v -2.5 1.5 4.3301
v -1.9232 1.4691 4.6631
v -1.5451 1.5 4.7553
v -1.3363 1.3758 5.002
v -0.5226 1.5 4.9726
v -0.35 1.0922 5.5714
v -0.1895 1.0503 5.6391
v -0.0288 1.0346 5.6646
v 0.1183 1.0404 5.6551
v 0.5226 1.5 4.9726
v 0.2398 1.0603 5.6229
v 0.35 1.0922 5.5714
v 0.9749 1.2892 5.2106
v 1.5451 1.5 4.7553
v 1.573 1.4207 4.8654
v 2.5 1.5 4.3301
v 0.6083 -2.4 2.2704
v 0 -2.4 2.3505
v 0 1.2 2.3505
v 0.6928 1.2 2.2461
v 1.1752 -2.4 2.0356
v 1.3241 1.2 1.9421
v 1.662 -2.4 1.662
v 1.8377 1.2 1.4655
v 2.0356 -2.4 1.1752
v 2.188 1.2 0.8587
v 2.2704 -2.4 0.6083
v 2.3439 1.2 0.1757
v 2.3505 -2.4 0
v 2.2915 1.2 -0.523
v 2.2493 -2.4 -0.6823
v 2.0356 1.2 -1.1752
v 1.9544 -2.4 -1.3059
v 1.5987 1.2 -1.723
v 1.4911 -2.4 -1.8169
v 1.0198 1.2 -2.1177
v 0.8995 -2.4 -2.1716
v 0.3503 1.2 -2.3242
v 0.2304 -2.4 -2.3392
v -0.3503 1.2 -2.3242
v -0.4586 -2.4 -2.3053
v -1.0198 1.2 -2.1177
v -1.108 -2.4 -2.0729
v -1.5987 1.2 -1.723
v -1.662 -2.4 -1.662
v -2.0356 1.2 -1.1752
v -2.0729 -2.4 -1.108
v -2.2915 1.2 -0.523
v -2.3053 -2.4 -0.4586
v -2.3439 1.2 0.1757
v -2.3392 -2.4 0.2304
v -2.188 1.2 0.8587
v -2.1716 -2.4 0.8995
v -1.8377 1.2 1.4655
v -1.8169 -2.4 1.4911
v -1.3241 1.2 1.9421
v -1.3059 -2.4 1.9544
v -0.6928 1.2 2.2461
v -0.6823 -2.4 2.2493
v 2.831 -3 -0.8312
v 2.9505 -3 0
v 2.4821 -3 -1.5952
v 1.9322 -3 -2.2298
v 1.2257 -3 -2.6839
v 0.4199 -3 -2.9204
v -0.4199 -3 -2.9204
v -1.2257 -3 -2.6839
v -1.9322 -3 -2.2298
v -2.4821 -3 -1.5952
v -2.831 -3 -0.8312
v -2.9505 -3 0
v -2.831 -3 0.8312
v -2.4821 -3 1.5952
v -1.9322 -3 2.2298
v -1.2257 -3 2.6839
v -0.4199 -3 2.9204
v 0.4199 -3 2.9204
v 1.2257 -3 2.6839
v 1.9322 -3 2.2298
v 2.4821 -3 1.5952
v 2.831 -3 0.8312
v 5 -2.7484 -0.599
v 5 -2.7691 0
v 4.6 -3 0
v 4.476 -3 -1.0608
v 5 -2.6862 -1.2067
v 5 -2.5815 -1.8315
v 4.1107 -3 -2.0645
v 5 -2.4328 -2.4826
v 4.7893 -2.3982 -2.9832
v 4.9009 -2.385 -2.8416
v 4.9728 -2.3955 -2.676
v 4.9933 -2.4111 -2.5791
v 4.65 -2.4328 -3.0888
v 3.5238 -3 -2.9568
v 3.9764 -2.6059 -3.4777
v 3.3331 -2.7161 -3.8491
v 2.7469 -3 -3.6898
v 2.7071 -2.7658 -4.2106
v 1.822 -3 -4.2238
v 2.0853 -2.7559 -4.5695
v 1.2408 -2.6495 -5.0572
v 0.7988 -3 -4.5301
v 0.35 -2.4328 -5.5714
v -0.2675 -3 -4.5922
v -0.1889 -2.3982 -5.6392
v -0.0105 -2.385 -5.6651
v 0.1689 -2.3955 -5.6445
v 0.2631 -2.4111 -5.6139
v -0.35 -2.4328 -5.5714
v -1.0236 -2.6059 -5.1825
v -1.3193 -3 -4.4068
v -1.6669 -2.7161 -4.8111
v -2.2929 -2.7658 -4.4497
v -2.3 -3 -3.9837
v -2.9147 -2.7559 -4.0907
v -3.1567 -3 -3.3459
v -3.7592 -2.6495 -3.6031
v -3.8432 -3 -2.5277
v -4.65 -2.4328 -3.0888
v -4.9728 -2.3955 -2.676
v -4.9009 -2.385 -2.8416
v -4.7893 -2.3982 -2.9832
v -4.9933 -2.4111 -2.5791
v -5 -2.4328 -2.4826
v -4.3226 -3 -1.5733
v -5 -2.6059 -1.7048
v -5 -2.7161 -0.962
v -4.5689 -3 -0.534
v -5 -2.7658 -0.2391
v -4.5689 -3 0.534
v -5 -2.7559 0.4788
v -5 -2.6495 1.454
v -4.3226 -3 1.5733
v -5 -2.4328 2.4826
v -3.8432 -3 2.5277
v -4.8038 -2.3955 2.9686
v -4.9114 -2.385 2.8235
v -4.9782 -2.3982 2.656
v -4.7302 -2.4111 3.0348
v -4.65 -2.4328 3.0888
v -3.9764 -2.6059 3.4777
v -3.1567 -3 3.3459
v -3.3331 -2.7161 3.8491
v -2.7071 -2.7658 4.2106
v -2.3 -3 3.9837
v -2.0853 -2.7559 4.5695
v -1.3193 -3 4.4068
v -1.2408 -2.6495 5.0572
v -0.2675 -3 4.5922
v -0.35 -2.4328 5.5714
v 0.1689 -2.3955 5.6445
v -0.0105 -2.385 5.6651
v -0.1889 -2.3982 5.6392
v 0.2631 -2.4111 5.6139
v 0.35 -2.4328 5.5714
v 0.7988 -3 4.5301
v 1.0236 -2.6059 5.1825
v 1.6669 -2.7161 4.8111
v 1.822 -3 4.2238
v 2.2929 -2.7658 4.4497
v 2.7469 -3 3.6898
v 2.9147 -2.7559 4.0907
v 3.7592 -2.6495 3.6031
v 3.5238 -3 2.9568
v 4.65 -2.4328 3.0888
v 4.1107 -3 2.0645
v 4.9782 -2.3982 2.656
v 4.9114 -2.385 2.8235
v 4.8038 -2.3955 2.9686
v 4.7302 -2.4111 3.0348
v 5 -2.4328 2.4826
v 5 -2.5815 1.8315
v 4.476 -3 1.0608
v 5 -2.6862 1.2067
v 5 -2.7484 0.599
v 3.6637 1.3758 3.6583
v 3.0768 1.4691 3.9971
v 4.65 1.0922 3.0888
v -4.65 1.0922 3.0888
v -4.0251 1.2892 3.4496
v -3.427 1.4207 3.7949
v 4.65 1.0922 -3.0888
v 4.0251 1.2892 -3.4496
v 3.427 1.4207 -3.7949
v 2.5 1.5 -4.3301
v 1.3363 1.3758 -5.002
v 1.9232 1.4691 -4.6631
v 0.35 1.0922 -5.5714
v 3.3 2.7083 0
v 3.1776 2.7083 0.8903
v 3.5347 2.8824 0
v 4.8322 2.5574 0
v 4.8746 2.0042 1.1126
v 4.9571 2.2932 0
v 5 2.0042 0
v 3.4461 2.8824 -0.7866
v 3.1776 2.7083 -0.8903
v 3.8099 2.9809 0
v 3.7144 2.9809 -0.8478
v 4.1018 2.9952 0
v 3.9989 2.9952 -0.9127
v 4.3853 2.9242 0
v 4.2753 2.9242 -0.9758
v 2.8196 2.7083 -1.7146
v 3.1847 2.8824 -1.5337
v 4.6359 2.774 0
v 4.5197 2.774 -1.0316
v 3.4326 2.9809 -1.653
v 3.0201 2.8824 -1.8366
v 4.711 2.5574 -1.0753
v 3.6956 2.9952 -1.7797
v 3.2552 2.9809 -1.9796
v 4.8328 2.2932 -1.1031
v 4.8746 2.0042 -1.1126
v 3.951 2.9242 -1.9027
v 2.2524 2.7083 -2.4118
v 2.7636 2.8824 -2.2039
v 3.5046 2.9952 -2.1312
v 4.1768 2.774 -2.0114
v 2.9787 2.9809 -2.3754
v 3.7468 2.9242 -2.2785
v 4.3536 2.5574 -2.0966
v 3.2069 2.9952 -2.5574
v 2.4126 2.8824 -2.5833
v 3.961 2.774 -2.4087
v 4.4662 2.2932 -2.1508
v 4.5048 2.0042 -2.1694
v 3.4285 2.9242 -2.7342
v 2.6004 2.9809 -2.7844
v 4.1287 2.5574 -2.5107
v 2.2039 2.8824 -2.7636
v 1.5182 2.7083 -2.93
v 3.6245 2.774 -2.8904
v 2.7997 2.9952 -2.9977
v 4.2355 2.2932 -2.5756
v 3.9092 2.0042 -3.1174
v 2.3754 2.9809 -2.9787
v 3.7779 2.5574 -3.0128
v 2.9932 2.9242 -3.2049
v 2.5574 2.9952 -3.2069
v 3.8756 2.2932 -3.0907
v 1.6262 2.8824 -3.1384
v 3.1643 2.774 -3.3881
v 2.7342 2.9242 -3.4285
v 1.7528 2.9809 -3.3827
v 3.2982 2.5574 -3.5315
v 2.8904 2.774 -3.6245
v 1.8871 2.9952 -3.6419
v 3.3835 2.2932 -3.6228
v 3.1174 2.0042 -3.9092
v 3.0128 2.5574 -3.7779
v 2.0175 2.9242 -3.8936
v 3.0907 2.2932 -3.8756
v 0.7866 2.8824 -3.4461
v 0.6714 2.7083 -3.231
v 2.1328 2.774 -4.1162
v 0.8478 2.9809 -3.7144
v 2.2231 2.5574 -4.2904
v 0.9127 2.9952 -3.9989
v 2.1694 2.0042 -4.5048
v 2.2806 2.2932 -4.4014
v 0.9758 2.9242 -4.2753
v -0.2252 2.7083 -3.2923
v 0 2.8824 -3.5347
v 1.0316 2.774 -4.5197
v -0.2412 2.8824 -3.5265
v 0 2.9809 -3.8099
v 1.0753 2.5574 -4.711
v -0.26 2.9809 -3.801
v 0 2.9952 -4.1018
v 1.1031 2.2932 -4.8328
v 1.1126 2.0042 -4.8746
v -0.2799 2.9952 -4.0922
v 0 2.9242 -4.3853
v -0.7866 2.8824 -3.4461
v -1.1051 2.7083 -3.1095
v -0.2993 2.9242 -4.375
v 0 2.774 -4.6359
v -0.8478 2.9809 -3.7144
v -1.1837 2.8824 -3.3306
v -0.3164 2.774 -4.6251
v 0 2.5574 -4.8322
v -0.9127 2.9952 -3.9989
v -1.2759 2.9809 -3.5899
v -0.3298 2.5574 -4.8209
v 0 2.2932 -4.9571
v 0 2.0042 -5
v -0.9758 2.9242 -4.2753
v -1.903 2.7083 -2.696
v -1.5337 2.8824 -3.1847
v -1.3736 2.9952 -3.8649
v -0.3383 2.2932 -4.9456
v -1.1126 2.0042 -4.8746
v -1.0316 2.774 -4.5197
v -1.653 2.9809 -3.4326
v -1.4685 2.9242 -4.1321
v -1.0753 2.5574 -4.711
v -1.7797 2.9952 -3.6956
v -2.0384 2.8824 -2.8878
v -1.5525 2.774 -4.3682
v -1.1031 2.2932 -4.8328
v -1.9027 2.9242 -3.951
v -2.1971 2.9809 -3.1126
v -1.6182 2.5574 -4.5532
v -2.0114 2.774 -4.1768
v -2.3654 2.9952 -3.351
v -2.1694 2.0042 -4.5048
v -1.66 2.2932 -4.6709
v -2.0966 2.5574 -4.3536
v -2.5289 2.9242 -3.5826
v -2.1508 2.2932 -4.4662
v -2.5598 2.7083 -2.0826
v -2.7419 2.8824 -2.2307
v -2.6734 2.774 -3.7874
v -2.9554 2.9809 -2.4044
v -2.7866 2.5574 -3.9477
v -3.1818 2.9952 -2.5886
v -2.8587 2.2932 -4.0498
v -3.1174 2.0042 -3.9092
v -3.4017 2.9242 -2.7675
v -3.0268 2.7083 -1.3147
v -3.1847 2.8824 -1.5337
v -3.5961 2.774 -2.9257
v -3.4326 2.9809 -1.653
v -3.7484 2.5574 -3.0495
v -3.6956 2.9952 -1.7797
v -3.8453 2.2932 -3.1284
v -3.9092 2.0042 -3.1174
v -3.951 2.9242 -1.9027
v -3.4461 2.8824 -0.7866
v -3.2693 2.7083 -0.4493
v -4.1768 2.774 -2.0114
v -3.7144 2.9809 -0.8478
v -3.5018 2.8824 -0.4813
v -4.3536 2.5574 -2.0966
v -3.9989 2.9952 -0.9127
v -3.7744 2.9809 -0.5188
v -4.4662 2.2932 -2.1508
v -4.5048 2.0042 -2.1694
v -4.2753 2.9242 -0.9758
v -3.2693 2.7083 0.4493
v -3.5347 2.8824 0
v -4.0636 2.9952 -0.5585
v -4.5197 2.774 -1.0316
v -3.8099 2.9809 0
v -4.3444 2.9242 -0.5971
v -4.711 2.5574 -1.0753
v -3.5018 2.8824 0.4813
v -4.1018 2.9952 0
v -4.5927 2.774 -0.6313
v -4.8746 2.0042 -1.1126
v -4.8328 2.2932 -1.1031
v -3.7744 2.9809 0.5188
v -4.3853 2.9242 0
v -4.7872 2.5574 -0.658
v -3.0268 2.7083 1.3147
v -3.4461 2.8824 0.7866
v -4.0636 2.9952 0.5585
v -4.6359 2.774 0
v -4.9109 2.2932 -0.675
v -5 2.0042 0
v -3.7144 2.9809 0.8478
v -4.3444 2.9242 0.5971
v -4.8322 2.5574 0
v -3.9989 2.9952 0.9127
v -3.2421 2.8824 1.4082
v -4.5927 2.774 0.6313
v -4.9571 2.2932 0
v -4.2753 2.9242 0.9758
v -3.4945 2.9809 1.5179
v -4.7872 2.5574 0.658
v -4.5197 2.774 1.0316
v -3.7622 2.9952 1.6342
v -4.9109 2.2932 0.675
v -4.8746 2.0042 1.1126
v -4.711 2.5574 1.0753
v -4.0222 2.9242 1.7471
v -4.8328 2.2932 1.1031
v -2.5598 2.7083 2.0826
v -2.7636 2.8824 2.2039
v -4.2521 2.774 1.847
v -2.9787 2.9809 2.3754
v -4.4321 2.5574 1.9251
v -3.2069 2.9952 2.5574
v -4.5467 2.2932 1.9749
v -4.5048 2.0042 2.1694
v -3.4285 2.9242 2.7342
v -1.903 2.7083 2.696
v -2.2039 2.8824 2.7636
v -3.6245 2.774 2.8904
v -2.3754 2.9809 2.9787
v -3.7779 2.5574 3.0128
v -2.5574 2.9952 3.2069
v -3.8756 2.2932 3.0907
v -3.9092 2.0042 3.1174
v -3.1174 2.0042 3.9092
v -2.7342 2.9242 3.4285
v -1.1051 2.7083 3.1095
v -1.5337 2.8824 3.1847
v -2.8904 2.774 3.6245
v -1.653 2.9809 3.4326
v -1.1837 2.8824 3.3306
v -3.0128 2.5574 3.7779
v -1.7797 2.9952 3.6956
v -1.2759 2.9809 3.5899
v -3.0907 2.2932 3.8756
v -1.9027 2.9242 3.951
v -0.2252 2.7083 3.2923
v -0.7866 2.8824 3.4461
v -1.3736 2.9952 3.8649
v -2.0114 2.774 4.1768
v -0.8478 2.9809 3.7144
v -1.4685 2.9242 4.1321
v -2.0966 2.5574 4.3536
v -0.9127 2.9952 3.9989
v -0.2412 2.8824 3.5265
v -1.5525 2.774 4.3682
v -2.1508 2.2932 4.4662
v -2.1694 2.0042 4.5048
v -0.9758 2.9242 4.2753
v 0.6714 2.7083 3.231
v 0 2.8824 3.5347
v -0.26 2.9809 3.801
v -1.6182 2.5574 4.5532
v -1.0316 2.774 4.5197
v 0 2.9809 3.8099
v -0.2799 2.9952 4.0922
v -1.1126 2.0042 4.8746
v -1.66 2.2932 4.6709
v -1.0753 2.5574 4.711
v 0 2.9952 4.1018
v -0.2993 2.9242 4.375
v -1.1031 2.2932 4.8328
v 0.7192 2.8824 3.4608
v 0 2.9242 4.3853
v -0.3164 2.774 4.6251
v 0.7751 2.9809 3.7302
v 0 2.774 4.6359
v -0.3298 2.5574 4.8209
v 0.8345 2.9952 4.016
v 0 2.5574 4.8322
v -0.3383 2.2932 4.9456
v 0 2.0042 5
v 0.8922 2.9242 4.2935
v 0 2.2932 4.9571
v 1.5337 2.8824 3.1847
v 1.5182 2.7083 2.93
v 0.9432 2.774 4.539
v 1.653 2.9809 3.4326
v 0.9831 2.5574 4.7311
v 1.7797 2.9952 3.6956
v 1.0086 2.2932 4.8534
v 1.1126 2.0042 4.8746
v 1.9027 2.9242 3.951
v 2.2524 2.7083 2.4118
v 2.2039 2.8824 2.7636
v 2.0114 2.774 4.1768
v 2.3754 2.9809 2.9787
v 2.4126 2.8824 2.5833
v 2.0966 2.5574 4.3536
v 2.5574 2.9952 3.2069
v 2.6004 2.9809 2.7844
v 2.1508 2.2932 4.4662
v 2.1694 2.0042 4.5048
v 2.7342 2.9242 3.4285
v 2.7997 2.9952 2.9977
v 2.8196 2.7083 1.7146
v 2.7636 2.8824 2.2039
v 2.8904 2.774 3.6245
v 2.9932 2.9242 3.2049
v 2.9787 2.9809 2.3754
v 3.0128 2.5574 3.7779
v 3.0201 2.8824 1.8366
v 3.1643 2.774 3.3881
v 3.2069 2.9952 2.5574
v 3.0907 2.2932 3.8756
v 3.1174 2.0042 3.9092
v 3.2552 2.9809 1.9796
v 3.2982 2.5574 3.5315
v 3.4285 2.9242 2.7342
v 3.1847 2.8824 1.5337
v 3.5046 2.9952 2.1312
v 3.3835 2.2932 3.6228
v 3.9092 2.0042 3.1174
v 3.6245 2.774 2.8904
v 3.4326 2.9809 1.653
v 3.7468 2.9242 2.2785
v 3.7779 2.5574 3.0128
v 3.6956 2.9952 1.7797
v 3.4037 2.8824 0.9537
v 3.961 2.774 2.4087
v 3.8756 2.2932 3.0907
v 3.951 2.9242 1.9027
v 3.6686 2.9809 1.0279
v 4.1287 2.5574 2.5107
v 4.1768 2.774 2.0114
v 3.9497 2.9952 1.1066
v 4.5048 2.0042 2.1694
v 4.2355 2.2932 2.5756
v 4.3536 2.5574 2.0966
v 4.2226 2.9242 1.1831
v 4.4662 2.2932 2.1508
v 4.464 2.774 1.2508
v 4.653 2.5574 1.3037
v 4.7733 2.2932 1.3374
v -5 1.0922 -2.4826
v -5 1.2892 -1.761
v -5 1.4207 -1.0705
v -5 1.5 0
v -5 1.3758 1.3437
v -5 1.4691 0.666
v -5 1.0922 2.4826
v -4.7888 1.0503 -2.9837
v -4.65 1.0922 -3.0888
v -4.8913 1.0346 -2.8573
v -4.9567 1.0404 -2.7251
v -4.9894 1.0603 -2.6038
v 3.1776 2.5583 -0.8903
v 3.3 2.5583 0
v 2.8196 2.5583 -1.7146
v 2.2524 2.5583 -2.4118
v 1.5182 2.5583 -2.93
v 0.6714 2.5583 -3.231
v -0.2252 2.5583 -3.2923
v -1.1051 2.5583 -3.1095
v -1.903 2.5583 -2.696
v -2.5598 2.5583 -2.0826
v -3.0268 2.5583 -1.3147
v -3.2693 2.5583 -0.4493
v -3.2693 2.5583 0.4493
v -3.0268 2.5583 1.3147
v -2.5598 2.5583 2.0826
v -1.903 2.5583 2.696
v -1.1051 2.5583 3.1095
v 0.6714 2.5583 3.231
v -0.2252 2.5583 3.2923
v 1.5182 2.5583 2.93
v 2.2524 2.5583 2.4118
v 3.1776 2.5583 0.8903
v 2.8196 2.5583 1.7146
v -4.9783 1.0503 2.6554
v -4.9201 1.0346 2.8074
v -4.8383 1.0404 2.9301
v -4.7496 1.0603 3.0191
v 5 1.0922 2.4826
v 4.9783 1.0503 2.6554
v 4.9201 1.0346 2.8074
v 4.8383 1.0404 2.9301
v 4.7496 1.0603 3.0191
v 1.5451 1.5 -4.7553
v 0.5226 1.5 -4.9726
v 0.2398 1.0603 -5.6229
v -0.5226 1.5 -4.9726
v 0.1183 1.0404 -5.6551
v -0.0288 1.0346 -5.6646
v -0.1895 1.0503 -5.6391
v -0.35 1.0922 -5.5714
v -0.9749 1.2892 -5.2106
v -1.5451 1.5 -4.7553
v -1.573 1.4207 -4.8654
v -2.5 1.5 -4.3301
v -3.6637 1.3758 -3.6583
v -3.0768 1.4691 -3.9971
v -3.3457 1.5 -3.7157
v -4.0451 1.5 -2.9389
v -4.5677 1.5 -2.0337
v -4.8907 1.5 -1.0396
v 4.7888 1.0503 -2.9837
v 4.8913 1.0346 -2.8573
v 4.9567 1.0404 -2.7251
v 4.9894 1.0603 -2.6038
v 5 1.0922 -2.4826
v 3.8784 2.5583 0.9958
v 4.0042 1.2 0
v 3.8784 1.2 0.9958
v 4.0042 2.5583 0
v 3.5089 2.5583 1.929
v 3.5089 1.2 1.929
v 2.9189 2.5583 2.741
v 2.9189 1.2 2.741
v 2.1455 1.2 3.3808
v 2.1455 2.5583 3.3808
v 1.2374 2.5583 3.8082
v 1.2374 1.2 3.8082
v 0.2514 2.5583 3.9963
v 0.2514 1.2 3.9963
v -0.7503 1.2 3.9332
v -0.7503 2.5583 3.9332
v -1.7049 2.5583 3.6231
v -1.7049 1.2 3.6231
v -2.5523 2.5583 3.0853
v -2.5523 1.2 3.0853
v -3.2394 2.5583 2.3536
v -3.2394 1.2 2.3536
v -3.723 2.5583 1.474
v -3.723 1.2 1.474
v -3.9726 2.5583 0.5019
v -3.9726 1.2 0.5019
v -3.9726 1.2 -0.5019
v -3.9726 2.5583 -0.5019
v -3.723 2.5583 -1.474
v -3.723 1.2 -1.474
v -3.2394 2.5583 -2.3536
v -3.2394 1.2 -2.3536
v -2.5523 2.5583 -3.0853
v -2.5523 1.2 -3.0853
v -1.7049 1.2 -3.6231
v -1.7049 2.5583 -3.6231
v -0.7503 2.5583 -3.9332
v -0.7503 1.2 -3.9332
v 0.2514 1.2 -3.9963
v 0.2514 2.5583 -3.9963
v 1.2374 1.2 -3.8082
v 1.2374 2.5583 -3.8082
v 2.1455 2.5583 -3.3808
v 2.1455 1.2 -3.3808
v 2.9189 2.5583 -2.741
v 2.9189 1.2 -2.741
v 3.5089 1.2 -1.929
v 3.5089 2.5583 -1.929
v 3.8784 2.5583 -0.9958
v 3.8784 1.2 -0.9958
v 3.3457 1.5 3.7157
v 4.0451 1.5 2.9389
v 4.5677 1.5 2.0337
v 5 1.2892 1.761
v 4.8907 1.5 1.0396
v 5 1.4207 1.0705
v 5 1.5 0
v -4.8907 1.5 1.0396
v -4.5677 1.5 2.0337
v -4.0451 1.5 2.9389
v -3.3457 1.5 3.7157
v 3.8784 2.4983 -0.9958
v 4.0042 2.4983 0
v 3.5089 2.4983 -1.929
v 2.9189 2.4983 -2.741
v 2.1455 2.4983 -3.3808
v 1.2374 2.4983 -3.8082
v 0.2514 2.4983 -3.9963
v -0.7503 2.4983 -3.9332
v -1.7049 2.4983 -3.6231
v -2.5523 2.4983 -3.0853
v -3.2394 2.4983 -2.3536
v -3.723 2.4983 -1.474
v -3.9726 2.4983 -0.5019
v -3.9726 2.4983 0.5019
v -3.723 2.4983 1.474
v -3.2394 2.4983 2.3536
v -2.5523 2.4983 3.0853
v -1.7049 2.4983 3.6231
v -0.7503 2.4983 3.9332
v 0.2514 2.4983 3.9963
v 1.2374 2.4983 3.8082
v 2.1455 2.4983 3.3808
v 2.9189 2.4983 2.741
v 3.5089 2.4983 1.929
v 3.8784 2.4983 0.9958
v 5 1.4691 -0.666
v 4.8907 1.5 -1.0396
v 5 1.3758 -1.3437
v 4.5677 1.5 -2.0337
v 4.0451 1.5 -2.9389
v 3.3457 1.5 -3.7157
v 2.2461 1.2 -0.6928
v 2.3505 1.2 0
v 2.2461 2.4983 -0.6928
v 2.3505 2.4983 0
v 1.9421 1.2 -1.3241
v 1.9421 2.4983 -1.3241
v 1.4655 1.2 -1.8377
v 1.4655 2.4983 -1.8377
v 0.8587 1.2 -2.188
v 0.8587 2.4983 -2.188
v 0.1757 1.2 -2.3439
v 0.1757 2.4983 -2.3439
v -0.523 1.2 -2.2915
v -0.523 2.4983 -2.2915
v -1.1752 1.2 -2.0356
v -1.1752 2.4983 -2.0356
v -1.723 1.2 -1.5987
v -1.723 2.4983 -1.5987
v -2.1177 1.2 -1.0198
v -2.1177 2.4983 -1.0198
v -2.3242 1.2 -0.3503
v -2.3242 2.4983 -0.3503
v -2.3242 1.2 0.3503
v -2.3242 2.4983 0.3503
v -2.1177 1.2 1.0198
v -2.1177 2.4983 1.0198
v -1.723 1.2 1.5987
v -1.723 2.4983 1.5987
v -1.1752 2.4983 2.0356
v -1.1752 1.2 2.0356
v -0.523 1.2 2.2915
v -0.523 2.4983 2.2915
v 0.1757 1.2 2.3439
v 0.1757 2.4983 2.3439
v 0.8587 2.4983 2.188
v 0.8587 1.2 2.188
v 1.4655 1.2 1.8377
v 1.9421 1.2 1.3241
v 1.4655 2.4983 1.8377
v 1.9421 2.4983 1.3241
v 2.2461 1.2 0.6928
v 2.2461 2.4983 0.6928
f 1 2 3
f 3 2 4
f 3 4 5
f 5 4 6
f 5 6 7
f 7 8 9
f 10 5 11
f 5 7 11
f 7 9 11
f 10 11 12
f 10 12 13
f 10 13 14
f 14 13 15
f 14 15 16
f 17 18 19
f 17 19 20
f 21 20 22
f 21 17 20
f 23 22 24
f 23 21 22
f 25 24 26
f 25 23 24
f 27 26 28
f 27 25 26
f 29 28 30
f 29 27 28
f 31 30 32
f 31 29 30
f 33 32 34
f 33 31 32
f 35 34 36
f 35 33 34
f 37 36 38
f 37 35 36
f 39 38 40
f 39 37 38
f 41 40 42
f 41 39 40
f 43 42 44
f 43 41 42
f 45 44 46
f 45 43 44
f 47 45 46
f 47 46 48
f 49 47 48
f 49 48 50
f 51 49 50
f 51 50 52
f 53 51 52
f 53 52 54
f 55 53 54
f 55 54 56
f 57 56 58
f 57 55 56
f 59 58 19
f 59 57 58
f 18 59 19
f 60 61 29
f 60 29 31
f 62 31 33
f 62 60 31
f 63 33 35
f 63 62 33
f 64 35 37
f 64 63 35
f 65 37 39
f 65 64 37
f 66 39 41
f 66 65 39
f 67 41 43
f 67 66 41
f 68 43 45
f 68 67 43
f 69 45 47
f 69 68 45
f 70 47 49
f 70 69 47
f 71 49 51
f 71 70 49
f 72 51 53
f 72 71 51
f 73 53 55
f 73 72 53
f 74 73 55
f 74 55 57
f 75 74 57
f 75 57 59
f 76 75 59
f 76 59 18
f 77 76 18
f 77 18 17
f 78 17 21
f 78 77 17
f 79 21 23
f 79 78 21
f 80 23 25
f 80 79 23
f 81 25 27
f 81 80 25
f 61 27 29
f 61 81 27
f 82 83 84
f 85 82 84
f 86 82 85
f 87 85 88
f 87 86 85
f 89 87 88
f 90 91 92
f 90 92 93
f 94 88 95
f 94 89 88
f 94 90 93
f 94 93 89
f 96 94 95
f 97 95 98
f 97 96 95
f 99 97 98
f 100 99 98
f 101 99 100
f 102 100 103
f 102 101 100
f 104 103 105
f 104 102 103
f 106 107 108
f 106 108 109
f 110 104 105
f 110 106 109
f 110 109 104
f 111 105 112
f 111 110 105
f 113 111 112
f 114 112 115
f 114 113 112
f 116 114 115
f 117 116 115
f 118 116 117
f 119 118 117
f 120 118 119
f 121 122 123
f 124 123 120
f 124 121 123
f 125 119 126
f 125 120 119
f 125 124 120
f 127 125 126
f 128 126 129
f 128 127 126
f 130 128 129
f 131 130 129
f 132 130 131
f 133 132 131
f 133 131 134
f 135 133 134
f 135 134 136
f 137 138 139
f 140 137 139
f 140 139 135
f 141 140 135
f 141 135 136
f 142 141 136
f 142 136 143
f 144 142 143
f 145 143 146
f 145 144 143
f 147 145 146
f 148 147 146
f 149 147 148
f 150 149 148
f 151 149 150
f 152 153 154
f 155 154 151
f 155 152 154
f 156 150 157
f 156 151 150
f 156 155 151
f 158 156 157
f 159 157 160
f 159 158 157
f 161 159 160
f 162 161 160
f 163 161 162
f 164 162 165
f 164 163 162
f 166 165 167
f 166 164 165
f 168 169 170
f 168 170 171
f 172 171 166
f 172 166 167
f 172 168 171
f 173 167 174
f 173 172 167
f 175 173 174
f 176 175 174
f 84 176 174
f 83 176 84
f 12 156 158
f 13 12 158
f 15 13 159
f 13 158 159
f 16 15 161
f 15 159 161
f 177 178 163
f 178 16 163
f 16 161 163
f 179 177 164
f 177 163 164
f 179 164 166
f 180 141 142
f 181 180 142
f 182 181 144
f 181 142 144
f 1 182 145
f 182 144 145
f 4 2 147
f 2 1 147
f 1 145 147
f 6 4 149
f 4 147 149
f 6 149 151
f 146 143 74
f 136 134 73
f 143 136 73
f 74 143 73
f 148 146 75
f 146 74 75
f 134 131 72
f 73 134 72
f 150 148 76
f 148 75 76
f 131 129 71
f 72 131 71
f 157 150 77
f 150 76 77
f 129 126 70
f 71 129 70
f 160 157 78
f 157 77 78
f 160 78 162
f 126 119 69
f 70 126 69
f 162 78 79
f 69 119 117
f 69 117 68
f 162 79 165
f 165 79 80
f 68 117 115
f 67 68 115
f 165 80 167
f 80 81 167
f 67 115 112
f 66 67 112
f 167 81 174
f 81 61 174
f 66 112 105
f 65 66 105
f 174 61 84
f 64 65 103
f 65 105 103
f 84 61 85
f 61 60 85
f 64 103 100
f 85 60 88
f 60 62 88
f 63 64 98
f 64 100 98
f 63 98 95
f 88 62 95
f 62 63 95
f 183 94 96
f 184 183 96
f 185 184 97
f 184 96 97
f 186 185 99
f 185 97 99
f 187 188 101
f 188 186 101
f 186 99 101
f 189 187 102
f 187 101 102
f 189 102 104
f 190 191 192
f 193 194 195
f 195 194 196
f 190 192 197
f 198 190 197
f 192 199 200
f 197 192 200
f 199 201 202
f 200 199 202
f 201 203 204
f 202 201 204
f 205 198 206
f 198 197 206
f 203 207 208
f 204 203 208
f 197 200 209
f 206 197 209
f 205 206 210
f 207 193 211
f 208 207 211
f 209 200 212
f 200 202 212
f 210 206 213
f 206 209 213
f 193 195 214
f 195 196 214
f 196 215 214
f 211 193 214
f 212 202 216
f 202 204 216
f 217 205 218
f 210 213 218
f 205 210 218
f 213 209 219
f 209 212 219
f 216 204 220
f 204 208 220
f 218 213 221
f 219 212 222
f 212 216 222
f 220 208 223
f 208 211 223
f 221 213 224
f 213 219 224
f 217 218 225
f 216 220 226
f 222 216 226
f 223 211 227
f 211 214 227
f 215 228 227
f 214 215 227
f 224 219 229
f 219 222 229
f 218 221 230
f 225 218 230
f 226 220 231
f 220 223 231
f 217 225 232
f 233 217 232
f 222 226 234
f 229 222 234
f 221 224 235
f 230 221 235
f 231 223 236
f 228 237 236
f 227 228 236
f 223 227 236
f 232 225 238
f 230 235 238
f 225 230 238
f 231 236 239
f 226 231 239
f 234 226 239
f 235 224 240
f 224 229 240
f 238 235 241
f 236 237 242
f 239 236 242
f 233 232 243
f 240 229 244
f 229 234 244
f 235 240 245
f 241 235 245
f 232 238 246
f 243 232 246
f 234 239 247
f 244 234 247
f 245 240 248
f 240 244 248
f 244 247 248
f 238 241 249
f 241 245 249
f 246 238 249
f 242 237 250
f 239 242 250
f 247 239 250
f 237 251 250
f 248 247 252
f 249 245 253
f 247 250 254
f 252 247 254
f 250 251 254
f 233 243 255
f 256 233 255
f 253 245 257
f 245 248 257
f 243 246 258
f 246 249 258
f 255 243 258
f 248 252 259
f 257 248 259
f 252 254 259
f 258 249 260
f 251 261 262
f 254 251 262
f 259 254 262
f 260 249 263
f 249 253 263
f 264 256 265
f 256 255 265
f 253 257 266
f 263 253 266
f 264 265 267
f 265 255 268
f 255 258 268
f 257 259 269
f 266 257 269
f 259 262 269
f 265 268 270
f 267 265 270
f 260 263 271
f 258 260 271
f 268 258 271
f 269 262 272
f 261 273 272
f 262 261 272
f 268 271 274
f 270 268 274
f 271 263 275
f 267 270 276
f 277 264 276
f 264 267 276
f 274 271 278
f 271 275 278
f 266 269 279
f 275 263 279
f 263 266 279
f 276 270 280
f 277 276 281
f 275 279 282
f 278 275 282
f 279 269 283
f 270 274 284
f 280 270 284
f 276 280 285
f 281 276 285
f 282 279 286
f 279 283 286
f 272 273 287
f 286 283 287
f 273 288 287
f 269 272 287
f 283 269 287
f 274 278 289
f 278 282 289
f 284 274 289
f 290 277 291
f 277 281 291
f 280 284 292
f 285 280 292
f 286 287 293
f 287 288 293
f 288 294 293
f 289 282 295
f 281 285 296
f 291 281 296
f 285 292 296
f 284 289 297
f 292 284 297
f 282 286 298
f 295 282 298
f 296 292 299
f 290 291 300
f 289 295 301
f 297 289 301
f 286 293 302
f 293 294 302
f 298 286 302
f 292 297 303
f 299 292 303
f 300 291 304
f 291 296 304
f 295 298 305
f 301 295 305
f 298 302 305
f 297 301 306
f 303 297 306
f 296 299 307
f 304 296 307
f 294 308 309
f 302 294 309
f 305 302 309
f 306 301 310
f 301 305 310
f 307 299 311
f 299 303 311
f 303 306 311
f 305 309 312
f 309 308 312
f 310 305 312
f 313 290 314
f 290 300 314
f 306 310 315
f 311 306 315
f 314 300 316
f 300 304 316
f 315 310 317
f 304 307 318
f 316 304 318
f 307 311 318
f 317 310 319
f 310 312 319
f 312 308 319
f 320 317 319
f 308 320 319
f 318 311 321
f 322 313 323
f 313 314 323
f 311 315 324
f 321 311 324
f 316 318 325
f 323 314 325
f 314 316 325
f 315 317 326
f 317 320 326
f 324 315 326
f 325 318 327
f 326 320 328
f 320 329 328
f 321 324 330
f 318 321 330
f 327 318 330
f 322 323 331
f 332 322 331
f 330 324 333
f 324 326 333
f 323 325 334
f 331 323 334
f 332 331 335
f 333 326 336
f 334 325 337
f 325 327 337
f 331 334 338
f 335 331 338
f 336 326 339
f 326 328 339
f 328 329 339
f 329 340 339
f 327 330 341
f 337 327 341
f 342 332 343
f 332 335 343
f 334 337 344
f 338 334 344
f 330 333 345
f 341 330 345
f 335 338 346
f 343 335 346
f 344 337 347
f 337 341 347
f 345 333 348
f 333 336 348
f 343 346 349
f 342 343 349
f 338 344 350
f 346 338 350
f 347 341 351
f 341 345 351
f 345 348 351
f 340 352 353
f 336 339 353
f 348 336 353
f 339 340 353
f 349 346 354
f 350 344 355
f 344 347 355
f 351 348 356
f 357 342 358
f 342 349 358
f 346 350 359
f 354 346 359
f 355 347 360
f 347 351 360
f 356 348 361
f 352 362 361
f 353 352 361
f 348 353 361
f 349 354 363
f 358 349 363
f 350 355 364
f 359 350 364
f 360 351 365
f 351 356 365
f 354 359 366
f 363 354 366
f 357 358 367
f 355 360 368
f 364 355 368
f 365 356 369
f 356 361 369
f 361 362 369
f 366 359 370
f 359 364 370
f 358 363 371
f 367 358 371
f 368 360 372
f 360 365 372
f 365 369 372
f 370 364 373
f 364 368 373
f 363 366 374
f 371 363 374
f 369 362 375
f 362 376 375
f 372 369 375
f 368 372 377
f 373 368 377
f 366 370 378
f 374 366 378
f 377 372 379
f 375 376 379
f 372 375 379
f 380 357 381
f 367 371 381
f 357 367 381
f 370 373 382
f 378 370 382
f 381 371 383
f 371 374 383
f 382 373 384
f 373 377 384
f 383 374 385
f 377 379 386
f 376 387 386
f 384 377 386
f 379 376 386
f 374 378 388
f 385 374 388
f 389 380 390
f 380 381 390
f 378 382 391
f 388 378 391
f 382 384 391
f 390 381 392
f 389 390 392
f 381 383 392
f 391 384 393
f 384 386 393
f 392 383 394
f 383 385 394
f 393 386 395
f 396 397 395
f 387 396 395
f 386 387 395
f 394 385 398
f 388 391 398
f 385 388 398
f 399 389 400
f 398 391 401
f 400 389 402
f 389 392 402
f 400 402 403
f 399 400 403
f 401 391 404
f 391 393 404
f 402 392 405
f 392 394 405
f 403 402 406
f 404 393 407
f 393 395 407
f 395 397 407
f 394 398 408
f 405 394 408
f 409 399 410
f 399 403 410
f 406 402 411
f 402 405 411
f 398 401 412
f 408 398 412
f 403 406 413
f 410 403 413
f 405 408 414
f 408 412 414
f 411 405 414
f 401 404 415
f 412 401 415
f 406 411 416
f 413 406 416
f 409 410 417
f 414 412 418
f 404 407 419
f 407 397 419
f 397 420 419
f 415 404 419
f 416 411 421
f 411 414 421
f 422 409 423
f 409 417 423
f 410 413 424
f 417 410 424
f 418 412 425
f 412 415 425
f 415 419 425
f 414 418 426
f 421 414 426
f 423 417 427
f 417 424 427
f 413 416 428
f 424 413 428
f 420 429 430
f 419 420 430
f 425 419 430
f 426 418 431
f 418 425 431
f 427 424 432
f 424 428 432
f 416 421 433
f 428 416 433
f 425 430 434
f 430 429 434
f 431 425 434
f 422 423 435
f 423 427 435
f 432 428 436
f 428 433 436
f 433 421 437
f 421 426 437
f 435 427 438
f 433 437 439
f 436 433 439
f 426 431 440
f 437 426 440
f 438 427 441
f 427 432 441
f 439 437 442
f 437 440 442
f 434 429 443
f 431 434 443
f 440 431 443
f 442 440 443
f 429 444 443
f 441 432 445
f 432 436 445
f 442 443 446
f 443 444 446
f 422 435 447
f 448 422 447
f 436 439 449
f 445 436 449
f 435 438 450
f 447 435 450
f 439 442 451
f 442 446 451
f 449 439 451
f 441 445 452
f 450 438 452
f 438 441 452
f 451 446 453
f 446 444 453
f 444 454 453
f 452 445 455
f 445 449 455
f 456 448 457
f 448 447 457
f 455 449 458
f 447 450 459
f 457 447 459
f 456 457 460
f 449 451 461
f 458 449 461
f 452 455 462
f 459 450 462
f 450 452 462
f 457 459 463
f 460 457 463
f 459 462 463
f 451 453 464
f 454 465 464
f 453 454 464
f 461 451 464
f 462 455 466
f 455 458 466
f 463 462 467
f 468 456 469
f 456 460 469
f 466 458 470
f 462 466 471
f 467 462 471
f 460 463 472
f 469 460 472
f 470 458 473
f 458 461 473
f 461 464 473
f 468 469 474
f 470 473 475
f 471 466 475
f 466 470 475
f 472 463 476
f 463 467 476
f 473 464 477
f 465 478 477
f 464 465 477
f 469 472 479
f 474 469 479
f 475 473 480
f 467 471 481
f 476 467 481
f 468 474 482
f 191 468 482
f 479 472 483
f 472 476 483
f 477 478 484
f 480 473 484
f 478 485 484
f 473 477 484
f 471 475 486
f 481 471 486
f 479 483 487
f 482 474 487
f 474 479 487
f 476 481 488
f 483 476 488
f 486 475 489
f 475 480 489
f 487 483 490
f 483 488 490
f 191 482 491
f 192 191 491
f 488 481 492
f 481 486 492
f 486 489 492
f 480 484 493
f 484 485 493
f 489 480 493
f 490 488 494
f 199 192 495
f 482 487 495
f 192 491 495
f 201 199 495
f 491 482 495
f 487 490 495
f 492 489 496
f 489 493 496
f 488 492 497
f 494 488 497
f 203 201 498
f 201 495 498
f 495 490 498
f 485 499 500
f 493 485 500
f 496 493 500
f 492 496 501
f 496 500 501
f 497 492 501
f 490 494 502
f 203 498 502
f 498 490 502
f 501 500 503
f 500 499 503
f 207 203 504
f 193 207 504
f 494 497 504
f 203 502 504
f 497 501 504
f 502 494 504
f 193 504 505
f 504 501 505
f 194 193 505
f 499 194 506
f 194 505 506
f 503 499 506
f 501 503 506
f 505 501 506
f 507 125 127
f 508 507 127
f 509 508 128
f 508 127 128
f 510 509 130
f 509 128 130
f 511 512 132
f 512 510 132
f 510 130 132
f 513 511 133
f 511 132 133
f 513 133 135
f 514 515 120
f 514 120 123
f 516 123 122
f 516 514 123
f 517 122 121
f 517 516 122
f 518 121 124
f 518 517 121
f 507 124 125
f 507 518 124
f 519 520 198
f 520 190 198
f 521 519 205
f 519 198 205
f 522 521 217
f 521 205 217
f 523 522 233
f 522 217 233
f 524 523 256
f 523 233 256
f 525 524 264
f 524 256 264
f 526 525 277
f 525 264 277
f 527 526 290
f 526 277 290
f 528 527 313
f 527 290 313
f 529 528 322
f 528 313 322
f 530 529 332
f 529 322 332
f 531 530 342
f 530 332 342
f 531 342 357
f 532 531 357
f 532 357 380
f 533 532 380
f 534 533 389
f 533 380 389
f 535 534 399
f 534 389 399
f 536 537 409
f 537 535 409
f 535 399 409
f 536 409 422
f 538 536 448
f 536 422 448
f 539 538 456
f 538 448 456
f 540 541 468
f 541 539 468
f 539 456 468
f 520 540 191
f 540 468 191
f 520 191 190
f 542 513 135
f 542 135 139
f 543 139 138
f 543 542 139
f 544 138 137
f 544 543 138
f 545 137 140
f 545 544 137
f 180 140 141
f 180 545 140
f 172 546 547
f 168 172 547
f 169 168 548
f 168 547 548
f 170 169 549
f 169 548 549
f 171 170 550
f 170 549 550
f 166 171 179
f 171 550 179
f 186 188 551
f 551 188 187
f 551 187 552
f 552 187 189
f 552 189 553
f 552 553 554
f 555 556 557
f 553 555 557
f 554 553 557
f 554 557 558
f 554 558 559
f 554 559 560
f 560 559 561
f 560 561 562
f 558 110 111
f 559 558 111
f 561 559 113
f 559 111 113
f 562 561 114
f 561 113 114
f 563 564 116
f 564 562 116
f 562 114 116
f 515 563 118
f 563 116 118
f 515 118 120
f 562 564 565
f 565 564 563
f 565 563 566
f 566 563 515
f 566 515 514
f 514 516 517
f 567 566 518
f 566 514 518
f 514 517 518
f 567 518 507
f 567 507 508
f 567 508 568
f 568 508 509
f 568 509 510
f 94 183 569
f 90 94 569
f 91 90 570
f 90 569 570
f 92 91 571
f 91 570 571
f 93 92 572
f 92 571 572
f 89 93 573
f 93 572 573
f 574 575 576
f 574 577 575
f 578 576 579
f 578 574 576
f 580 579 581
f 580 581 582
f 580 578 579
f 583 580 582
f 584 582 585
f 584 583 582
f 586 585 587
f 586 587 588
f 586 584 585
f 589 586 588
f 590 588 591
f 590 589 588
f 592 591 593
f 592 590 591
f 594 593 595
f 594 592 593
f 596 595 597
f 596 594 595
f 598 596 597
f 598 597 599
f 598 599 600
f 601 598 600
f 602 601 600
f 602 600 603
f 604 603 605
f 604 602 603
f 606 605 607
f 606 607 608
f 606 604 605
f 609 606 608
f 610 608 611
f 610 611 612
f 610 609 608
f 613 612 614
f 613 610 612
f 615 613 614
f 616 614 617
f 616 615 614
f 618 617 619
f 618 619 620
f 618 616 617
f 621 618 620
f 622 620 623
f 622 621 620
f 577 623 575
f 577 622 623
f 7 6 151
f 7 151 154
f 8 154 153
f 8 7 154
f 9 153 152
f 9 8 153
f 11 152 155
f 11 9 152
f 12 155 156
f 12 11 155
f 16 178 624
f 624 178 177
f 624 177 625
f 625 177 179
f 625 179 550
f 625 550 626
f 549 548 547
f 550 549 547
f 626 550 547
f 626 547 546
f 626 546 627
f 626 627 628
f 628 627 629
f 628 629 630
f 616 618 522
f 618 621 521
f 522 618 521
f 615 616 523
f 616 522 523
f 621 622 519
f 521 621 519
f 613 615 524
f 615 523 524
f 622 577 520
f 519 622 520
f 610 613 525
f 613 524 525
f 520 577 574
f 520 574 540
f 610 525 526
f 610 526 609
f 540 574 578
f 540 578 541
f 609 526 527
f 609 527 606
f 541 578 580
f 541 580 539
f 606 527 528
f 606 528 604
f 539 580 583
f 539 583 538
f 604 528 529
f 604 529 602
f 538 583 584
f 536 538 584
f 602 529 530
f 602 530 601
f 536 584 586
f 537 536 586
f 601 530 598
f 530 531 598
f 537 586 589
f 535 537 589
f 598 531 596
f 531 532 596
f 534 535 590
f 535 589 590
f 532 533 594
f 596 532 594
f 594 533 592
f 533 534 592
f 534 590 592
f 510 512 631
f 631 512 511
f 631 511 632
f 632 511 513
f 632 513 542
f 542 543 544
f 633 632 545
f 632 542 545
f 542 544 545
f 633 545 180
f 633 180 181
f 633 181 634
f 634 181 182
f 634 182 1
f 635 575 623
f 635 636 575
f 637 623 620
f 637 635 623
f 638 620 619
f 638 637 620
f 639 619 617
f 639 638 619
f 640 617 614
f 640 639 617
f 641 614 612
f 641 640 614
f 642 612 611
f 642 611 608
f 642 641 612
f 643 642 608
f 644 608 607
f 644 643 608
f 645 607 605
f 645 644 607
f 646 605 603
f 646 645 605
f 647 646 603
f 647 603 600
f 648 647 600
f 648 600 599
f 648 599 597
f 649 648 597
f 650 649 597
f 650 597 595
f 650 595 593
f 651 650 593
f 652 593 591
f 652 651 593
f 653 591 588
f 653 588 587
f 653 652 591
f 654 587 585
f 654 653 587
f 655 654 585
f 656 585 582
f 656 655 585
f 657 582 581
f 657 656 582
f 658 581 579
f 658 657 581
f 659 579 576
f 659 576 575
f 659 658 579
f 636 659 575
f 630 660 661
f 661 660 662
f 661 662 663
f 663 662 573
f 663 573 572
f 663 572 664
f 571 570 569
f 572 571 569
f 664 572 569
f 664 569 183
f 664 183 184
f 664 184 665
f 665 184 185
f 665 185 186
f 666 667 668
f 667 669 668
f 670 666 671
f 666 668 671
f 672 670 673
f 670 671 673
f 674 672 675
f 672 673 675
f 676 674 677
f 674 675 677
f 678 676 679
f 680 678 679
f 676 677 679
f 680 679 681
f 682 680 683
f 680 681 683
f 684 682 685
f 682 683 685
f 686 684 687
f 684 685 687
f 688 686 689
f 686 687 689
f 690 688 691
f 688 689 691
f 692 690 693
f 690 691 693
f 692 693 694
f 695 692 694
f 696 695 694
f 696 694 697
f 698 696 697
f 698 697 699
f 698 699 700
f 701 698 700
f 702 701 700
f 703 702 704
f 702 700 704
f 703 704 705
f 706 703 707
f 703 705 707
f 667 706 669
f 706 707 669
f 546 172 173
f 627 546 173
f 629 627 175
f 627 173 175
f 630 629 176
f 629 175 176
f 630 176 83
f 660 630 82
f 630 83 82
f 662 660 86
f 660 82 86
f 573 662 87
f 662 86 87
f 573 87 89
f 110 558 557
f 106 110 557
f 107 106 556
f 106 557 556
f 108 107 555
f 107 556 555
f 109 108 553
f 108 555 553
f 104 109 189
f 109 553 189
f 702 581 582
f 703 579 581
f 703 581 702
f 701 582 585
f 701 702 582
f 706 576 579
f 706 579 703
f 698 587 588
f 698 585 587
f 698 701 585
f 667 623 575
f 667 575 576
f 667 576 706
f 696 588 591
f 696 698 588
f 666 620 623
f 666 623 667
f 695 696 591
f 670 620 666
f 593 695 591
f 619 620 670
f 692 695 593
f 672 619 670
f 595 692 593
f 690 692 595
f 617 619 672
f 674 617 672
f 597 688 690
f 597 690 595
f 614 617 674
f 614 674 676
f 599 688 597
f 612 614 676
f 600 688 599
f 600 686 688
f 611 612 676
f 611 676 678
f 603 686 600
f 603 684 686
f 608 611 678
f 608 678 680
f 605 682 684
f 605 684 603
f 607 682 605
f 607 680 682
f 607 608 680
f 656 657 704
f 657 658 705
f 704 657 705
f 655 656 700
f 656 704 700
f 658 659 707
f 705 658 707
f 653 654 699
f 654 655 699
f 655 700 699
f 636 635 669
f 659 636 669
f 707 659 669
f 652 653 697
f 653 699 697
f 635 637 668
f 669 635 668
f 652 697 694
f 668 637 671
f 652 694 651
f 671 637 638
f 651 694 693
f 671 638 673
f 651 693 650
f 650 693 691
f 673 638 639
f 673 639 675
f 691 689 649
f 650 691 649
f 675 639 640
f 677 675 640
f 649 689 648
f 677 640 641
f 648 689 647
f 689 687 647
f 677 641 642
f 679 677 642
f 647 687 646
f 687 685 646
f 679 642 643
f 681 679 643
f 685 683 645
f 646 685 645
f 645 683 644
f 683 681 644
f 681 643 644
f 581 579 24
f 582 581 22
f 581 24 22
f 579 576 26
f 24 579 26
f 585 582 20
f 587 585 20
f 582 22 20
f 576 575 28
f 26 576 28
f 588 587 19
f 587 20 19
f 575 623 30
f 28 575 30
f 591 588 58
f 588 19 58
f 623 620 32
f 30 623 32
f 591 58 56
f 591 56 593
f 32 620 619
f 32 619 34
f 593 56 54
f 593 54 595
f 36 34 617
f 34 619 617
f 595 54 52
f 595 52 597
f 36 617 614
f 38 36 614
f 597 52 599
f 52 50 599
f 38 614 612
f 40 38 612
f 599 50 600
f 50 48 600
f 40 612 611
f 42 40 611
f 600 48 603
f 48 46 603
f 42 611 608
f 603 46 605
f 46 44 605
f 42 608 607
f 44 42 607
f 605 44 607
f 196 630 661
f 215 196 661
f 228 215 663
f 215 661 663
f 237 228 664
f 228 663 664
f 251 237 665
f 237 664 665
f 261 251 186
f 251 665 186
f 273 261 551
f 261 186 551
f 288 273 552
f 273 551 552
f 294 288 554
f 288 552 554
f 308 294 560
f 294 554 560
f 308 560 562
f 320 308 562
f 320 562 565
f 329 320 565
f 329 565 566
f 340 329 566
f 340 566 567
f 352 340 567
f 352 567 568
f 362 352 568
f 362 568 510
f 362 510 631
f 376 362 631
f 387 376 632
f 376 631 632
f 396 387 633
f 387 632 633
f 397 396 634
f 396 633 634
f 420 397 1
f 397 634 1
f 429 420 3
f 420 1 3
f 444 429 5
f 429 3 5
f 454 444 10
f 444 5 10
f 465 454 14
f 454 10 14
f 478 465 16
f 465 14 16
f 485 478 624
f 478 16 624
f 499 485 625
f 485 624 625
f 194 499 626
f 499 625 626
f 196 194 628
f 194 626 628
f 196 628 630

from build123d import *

# Parameters (mm, degrees)
BOSS_EXTRUDE1_DEPTH      = 3
BOSS_EXTRUDE1_DEPTH_BACK = 3
SKETCH2_R                = 2.350480947
FILLET1_R                = 0.7
SKETCH12_W               = 0.704163056
SKETCH12_H               = 1.358326112
SKETCH4_W                = 1.653682109
SKETCH4_H                = 1.298326112


with BuildPart() as part:
    # Sketch2 → Boss-Extrude1 (new, two sides: drawn at the far end of the back side and taken through both)
    with BuildSketch(Plane(origin=(0, 0, 0), x_dir=(1, 0, 0), z_dir=(0, 1, 0)).offset(-BOSS_EXTRUDE1_DEPTH_BACK)):
        Polygon((0, 5.773502692), (-5, 2.886751346), (-5, -2.886751346), (0, -5.773502692), (5, -2.886751346), (5, 2.886751346), align=None)
        with Locations(Location((0, 0, 0), (0, 0, 270))):
            Circle(SKETCH2_R, mode=Mode.SUBTRACT)
    extrude(amount=BOSS_EXTRUDE1_DEPTH + BOSS_EXTRUDE1_DEPTH_BACK)

    # Fillet1
    fillet1_edges = [part.edges().sort_by_distance(p)[0] for p in [
        (5, 0, -2.886751346),
        (5, 0, 2.886751346),
        (0, 0, 5.773502692),
        (-5, 0, 2.886751346),
        (-5, 0, -2.886751346),
        (0, 0, -5.773502692),
    ]]
    fillet(fillet1_edges, radius=FILLET1_R)

    # Sketch3 → Cut-Revolve2 (revolve, cut)
    with BuildSketch(Plane(origin=(0, 0, 0), x_dir=(0, 0, -1), z_dir=(1, 0, 0)), mode=Mode.PRIVATE) as cut_revolve2_sk:
        with BuildLine():
            Line((5.773502692, 1.5), (5.773502692, 4))
            Line((5.773502692, 4), (2.350480947, 4))
            Line((2.350480947, 4), (2.350480947, 1.2))
            Line((2.350480947, 1.2), (3.3, 1.2))
            Line((3.3, 1.2), (3.3, 2.708326112))
            ThreePointArc((3.3, 2.708326112), (4.385253356, 2.924196426), (5, 2.004163056))
            Line((5, 2.004163056), (5, 1.5))
            Line((5, 1.5), (5.773502692, 0.958387584))
            Line((5.773502692, 0.958387584), (5.773502692, 1.5))
        make_face()
        Polygon((4.6, -3), (5.773502692, -2.322477905), (5.773502692, -3), align=None)
        Polygon((2.350480947, -3), (2.350480947, -2.4), (2.950480947, -3), align=None)
    revolve(cut_revolve2_sk.sketch.rotate(Axis((0, -3, 0), (0, 1, 0)), 270), axis=Axis((0, -3, 0), (0, 1, 0)), mode=Mode.SUBTRACT)

    # Sketch12 → Cut-Revolve3 (revolve, cut)
    with BuildSketch(Plane(origin=(0, 0, 0), x_dir=(0, 0, -1), z_dir=(1, 0, 0)), mode=Mode.PRIVATE) as cut_revolve3_sk:
        with Locations((3.652081528, 1.879163056)):
            Rectangle(SKETCH12_W, SKETCH12_H)
    revolve(cut_revolve3_sk.sketch.rotate(Axis((0, 3, 0), (0, -1, 0)), 90), axis=Axis((0, 3, 0), (0, -1, 0)), mode=Mode.SUBTRACT)


with BuildPart() as body_2:
    # Sketch4 → Revolve1 (revolve)
    with BuildSketch(Plane(origin=(0, 0, 0), x_dir=(0, 0, -1), z_dir=(1, 0, 0)), mode=Mode.PRIVATE) as revolve1_sk:
        with Locations((3.177322002, 1.849163056)):
            Rectangle(SKETCH4_W, SKETCH4_H)
    revolve(revolve1_sk.sketch.rotate(Axis((0, -3, 0), (0, 1, 0)), 270), axis=Axis((0, -3, 0), (0, 1, 0)))


solid = Compound([part.part, body_2.part])
